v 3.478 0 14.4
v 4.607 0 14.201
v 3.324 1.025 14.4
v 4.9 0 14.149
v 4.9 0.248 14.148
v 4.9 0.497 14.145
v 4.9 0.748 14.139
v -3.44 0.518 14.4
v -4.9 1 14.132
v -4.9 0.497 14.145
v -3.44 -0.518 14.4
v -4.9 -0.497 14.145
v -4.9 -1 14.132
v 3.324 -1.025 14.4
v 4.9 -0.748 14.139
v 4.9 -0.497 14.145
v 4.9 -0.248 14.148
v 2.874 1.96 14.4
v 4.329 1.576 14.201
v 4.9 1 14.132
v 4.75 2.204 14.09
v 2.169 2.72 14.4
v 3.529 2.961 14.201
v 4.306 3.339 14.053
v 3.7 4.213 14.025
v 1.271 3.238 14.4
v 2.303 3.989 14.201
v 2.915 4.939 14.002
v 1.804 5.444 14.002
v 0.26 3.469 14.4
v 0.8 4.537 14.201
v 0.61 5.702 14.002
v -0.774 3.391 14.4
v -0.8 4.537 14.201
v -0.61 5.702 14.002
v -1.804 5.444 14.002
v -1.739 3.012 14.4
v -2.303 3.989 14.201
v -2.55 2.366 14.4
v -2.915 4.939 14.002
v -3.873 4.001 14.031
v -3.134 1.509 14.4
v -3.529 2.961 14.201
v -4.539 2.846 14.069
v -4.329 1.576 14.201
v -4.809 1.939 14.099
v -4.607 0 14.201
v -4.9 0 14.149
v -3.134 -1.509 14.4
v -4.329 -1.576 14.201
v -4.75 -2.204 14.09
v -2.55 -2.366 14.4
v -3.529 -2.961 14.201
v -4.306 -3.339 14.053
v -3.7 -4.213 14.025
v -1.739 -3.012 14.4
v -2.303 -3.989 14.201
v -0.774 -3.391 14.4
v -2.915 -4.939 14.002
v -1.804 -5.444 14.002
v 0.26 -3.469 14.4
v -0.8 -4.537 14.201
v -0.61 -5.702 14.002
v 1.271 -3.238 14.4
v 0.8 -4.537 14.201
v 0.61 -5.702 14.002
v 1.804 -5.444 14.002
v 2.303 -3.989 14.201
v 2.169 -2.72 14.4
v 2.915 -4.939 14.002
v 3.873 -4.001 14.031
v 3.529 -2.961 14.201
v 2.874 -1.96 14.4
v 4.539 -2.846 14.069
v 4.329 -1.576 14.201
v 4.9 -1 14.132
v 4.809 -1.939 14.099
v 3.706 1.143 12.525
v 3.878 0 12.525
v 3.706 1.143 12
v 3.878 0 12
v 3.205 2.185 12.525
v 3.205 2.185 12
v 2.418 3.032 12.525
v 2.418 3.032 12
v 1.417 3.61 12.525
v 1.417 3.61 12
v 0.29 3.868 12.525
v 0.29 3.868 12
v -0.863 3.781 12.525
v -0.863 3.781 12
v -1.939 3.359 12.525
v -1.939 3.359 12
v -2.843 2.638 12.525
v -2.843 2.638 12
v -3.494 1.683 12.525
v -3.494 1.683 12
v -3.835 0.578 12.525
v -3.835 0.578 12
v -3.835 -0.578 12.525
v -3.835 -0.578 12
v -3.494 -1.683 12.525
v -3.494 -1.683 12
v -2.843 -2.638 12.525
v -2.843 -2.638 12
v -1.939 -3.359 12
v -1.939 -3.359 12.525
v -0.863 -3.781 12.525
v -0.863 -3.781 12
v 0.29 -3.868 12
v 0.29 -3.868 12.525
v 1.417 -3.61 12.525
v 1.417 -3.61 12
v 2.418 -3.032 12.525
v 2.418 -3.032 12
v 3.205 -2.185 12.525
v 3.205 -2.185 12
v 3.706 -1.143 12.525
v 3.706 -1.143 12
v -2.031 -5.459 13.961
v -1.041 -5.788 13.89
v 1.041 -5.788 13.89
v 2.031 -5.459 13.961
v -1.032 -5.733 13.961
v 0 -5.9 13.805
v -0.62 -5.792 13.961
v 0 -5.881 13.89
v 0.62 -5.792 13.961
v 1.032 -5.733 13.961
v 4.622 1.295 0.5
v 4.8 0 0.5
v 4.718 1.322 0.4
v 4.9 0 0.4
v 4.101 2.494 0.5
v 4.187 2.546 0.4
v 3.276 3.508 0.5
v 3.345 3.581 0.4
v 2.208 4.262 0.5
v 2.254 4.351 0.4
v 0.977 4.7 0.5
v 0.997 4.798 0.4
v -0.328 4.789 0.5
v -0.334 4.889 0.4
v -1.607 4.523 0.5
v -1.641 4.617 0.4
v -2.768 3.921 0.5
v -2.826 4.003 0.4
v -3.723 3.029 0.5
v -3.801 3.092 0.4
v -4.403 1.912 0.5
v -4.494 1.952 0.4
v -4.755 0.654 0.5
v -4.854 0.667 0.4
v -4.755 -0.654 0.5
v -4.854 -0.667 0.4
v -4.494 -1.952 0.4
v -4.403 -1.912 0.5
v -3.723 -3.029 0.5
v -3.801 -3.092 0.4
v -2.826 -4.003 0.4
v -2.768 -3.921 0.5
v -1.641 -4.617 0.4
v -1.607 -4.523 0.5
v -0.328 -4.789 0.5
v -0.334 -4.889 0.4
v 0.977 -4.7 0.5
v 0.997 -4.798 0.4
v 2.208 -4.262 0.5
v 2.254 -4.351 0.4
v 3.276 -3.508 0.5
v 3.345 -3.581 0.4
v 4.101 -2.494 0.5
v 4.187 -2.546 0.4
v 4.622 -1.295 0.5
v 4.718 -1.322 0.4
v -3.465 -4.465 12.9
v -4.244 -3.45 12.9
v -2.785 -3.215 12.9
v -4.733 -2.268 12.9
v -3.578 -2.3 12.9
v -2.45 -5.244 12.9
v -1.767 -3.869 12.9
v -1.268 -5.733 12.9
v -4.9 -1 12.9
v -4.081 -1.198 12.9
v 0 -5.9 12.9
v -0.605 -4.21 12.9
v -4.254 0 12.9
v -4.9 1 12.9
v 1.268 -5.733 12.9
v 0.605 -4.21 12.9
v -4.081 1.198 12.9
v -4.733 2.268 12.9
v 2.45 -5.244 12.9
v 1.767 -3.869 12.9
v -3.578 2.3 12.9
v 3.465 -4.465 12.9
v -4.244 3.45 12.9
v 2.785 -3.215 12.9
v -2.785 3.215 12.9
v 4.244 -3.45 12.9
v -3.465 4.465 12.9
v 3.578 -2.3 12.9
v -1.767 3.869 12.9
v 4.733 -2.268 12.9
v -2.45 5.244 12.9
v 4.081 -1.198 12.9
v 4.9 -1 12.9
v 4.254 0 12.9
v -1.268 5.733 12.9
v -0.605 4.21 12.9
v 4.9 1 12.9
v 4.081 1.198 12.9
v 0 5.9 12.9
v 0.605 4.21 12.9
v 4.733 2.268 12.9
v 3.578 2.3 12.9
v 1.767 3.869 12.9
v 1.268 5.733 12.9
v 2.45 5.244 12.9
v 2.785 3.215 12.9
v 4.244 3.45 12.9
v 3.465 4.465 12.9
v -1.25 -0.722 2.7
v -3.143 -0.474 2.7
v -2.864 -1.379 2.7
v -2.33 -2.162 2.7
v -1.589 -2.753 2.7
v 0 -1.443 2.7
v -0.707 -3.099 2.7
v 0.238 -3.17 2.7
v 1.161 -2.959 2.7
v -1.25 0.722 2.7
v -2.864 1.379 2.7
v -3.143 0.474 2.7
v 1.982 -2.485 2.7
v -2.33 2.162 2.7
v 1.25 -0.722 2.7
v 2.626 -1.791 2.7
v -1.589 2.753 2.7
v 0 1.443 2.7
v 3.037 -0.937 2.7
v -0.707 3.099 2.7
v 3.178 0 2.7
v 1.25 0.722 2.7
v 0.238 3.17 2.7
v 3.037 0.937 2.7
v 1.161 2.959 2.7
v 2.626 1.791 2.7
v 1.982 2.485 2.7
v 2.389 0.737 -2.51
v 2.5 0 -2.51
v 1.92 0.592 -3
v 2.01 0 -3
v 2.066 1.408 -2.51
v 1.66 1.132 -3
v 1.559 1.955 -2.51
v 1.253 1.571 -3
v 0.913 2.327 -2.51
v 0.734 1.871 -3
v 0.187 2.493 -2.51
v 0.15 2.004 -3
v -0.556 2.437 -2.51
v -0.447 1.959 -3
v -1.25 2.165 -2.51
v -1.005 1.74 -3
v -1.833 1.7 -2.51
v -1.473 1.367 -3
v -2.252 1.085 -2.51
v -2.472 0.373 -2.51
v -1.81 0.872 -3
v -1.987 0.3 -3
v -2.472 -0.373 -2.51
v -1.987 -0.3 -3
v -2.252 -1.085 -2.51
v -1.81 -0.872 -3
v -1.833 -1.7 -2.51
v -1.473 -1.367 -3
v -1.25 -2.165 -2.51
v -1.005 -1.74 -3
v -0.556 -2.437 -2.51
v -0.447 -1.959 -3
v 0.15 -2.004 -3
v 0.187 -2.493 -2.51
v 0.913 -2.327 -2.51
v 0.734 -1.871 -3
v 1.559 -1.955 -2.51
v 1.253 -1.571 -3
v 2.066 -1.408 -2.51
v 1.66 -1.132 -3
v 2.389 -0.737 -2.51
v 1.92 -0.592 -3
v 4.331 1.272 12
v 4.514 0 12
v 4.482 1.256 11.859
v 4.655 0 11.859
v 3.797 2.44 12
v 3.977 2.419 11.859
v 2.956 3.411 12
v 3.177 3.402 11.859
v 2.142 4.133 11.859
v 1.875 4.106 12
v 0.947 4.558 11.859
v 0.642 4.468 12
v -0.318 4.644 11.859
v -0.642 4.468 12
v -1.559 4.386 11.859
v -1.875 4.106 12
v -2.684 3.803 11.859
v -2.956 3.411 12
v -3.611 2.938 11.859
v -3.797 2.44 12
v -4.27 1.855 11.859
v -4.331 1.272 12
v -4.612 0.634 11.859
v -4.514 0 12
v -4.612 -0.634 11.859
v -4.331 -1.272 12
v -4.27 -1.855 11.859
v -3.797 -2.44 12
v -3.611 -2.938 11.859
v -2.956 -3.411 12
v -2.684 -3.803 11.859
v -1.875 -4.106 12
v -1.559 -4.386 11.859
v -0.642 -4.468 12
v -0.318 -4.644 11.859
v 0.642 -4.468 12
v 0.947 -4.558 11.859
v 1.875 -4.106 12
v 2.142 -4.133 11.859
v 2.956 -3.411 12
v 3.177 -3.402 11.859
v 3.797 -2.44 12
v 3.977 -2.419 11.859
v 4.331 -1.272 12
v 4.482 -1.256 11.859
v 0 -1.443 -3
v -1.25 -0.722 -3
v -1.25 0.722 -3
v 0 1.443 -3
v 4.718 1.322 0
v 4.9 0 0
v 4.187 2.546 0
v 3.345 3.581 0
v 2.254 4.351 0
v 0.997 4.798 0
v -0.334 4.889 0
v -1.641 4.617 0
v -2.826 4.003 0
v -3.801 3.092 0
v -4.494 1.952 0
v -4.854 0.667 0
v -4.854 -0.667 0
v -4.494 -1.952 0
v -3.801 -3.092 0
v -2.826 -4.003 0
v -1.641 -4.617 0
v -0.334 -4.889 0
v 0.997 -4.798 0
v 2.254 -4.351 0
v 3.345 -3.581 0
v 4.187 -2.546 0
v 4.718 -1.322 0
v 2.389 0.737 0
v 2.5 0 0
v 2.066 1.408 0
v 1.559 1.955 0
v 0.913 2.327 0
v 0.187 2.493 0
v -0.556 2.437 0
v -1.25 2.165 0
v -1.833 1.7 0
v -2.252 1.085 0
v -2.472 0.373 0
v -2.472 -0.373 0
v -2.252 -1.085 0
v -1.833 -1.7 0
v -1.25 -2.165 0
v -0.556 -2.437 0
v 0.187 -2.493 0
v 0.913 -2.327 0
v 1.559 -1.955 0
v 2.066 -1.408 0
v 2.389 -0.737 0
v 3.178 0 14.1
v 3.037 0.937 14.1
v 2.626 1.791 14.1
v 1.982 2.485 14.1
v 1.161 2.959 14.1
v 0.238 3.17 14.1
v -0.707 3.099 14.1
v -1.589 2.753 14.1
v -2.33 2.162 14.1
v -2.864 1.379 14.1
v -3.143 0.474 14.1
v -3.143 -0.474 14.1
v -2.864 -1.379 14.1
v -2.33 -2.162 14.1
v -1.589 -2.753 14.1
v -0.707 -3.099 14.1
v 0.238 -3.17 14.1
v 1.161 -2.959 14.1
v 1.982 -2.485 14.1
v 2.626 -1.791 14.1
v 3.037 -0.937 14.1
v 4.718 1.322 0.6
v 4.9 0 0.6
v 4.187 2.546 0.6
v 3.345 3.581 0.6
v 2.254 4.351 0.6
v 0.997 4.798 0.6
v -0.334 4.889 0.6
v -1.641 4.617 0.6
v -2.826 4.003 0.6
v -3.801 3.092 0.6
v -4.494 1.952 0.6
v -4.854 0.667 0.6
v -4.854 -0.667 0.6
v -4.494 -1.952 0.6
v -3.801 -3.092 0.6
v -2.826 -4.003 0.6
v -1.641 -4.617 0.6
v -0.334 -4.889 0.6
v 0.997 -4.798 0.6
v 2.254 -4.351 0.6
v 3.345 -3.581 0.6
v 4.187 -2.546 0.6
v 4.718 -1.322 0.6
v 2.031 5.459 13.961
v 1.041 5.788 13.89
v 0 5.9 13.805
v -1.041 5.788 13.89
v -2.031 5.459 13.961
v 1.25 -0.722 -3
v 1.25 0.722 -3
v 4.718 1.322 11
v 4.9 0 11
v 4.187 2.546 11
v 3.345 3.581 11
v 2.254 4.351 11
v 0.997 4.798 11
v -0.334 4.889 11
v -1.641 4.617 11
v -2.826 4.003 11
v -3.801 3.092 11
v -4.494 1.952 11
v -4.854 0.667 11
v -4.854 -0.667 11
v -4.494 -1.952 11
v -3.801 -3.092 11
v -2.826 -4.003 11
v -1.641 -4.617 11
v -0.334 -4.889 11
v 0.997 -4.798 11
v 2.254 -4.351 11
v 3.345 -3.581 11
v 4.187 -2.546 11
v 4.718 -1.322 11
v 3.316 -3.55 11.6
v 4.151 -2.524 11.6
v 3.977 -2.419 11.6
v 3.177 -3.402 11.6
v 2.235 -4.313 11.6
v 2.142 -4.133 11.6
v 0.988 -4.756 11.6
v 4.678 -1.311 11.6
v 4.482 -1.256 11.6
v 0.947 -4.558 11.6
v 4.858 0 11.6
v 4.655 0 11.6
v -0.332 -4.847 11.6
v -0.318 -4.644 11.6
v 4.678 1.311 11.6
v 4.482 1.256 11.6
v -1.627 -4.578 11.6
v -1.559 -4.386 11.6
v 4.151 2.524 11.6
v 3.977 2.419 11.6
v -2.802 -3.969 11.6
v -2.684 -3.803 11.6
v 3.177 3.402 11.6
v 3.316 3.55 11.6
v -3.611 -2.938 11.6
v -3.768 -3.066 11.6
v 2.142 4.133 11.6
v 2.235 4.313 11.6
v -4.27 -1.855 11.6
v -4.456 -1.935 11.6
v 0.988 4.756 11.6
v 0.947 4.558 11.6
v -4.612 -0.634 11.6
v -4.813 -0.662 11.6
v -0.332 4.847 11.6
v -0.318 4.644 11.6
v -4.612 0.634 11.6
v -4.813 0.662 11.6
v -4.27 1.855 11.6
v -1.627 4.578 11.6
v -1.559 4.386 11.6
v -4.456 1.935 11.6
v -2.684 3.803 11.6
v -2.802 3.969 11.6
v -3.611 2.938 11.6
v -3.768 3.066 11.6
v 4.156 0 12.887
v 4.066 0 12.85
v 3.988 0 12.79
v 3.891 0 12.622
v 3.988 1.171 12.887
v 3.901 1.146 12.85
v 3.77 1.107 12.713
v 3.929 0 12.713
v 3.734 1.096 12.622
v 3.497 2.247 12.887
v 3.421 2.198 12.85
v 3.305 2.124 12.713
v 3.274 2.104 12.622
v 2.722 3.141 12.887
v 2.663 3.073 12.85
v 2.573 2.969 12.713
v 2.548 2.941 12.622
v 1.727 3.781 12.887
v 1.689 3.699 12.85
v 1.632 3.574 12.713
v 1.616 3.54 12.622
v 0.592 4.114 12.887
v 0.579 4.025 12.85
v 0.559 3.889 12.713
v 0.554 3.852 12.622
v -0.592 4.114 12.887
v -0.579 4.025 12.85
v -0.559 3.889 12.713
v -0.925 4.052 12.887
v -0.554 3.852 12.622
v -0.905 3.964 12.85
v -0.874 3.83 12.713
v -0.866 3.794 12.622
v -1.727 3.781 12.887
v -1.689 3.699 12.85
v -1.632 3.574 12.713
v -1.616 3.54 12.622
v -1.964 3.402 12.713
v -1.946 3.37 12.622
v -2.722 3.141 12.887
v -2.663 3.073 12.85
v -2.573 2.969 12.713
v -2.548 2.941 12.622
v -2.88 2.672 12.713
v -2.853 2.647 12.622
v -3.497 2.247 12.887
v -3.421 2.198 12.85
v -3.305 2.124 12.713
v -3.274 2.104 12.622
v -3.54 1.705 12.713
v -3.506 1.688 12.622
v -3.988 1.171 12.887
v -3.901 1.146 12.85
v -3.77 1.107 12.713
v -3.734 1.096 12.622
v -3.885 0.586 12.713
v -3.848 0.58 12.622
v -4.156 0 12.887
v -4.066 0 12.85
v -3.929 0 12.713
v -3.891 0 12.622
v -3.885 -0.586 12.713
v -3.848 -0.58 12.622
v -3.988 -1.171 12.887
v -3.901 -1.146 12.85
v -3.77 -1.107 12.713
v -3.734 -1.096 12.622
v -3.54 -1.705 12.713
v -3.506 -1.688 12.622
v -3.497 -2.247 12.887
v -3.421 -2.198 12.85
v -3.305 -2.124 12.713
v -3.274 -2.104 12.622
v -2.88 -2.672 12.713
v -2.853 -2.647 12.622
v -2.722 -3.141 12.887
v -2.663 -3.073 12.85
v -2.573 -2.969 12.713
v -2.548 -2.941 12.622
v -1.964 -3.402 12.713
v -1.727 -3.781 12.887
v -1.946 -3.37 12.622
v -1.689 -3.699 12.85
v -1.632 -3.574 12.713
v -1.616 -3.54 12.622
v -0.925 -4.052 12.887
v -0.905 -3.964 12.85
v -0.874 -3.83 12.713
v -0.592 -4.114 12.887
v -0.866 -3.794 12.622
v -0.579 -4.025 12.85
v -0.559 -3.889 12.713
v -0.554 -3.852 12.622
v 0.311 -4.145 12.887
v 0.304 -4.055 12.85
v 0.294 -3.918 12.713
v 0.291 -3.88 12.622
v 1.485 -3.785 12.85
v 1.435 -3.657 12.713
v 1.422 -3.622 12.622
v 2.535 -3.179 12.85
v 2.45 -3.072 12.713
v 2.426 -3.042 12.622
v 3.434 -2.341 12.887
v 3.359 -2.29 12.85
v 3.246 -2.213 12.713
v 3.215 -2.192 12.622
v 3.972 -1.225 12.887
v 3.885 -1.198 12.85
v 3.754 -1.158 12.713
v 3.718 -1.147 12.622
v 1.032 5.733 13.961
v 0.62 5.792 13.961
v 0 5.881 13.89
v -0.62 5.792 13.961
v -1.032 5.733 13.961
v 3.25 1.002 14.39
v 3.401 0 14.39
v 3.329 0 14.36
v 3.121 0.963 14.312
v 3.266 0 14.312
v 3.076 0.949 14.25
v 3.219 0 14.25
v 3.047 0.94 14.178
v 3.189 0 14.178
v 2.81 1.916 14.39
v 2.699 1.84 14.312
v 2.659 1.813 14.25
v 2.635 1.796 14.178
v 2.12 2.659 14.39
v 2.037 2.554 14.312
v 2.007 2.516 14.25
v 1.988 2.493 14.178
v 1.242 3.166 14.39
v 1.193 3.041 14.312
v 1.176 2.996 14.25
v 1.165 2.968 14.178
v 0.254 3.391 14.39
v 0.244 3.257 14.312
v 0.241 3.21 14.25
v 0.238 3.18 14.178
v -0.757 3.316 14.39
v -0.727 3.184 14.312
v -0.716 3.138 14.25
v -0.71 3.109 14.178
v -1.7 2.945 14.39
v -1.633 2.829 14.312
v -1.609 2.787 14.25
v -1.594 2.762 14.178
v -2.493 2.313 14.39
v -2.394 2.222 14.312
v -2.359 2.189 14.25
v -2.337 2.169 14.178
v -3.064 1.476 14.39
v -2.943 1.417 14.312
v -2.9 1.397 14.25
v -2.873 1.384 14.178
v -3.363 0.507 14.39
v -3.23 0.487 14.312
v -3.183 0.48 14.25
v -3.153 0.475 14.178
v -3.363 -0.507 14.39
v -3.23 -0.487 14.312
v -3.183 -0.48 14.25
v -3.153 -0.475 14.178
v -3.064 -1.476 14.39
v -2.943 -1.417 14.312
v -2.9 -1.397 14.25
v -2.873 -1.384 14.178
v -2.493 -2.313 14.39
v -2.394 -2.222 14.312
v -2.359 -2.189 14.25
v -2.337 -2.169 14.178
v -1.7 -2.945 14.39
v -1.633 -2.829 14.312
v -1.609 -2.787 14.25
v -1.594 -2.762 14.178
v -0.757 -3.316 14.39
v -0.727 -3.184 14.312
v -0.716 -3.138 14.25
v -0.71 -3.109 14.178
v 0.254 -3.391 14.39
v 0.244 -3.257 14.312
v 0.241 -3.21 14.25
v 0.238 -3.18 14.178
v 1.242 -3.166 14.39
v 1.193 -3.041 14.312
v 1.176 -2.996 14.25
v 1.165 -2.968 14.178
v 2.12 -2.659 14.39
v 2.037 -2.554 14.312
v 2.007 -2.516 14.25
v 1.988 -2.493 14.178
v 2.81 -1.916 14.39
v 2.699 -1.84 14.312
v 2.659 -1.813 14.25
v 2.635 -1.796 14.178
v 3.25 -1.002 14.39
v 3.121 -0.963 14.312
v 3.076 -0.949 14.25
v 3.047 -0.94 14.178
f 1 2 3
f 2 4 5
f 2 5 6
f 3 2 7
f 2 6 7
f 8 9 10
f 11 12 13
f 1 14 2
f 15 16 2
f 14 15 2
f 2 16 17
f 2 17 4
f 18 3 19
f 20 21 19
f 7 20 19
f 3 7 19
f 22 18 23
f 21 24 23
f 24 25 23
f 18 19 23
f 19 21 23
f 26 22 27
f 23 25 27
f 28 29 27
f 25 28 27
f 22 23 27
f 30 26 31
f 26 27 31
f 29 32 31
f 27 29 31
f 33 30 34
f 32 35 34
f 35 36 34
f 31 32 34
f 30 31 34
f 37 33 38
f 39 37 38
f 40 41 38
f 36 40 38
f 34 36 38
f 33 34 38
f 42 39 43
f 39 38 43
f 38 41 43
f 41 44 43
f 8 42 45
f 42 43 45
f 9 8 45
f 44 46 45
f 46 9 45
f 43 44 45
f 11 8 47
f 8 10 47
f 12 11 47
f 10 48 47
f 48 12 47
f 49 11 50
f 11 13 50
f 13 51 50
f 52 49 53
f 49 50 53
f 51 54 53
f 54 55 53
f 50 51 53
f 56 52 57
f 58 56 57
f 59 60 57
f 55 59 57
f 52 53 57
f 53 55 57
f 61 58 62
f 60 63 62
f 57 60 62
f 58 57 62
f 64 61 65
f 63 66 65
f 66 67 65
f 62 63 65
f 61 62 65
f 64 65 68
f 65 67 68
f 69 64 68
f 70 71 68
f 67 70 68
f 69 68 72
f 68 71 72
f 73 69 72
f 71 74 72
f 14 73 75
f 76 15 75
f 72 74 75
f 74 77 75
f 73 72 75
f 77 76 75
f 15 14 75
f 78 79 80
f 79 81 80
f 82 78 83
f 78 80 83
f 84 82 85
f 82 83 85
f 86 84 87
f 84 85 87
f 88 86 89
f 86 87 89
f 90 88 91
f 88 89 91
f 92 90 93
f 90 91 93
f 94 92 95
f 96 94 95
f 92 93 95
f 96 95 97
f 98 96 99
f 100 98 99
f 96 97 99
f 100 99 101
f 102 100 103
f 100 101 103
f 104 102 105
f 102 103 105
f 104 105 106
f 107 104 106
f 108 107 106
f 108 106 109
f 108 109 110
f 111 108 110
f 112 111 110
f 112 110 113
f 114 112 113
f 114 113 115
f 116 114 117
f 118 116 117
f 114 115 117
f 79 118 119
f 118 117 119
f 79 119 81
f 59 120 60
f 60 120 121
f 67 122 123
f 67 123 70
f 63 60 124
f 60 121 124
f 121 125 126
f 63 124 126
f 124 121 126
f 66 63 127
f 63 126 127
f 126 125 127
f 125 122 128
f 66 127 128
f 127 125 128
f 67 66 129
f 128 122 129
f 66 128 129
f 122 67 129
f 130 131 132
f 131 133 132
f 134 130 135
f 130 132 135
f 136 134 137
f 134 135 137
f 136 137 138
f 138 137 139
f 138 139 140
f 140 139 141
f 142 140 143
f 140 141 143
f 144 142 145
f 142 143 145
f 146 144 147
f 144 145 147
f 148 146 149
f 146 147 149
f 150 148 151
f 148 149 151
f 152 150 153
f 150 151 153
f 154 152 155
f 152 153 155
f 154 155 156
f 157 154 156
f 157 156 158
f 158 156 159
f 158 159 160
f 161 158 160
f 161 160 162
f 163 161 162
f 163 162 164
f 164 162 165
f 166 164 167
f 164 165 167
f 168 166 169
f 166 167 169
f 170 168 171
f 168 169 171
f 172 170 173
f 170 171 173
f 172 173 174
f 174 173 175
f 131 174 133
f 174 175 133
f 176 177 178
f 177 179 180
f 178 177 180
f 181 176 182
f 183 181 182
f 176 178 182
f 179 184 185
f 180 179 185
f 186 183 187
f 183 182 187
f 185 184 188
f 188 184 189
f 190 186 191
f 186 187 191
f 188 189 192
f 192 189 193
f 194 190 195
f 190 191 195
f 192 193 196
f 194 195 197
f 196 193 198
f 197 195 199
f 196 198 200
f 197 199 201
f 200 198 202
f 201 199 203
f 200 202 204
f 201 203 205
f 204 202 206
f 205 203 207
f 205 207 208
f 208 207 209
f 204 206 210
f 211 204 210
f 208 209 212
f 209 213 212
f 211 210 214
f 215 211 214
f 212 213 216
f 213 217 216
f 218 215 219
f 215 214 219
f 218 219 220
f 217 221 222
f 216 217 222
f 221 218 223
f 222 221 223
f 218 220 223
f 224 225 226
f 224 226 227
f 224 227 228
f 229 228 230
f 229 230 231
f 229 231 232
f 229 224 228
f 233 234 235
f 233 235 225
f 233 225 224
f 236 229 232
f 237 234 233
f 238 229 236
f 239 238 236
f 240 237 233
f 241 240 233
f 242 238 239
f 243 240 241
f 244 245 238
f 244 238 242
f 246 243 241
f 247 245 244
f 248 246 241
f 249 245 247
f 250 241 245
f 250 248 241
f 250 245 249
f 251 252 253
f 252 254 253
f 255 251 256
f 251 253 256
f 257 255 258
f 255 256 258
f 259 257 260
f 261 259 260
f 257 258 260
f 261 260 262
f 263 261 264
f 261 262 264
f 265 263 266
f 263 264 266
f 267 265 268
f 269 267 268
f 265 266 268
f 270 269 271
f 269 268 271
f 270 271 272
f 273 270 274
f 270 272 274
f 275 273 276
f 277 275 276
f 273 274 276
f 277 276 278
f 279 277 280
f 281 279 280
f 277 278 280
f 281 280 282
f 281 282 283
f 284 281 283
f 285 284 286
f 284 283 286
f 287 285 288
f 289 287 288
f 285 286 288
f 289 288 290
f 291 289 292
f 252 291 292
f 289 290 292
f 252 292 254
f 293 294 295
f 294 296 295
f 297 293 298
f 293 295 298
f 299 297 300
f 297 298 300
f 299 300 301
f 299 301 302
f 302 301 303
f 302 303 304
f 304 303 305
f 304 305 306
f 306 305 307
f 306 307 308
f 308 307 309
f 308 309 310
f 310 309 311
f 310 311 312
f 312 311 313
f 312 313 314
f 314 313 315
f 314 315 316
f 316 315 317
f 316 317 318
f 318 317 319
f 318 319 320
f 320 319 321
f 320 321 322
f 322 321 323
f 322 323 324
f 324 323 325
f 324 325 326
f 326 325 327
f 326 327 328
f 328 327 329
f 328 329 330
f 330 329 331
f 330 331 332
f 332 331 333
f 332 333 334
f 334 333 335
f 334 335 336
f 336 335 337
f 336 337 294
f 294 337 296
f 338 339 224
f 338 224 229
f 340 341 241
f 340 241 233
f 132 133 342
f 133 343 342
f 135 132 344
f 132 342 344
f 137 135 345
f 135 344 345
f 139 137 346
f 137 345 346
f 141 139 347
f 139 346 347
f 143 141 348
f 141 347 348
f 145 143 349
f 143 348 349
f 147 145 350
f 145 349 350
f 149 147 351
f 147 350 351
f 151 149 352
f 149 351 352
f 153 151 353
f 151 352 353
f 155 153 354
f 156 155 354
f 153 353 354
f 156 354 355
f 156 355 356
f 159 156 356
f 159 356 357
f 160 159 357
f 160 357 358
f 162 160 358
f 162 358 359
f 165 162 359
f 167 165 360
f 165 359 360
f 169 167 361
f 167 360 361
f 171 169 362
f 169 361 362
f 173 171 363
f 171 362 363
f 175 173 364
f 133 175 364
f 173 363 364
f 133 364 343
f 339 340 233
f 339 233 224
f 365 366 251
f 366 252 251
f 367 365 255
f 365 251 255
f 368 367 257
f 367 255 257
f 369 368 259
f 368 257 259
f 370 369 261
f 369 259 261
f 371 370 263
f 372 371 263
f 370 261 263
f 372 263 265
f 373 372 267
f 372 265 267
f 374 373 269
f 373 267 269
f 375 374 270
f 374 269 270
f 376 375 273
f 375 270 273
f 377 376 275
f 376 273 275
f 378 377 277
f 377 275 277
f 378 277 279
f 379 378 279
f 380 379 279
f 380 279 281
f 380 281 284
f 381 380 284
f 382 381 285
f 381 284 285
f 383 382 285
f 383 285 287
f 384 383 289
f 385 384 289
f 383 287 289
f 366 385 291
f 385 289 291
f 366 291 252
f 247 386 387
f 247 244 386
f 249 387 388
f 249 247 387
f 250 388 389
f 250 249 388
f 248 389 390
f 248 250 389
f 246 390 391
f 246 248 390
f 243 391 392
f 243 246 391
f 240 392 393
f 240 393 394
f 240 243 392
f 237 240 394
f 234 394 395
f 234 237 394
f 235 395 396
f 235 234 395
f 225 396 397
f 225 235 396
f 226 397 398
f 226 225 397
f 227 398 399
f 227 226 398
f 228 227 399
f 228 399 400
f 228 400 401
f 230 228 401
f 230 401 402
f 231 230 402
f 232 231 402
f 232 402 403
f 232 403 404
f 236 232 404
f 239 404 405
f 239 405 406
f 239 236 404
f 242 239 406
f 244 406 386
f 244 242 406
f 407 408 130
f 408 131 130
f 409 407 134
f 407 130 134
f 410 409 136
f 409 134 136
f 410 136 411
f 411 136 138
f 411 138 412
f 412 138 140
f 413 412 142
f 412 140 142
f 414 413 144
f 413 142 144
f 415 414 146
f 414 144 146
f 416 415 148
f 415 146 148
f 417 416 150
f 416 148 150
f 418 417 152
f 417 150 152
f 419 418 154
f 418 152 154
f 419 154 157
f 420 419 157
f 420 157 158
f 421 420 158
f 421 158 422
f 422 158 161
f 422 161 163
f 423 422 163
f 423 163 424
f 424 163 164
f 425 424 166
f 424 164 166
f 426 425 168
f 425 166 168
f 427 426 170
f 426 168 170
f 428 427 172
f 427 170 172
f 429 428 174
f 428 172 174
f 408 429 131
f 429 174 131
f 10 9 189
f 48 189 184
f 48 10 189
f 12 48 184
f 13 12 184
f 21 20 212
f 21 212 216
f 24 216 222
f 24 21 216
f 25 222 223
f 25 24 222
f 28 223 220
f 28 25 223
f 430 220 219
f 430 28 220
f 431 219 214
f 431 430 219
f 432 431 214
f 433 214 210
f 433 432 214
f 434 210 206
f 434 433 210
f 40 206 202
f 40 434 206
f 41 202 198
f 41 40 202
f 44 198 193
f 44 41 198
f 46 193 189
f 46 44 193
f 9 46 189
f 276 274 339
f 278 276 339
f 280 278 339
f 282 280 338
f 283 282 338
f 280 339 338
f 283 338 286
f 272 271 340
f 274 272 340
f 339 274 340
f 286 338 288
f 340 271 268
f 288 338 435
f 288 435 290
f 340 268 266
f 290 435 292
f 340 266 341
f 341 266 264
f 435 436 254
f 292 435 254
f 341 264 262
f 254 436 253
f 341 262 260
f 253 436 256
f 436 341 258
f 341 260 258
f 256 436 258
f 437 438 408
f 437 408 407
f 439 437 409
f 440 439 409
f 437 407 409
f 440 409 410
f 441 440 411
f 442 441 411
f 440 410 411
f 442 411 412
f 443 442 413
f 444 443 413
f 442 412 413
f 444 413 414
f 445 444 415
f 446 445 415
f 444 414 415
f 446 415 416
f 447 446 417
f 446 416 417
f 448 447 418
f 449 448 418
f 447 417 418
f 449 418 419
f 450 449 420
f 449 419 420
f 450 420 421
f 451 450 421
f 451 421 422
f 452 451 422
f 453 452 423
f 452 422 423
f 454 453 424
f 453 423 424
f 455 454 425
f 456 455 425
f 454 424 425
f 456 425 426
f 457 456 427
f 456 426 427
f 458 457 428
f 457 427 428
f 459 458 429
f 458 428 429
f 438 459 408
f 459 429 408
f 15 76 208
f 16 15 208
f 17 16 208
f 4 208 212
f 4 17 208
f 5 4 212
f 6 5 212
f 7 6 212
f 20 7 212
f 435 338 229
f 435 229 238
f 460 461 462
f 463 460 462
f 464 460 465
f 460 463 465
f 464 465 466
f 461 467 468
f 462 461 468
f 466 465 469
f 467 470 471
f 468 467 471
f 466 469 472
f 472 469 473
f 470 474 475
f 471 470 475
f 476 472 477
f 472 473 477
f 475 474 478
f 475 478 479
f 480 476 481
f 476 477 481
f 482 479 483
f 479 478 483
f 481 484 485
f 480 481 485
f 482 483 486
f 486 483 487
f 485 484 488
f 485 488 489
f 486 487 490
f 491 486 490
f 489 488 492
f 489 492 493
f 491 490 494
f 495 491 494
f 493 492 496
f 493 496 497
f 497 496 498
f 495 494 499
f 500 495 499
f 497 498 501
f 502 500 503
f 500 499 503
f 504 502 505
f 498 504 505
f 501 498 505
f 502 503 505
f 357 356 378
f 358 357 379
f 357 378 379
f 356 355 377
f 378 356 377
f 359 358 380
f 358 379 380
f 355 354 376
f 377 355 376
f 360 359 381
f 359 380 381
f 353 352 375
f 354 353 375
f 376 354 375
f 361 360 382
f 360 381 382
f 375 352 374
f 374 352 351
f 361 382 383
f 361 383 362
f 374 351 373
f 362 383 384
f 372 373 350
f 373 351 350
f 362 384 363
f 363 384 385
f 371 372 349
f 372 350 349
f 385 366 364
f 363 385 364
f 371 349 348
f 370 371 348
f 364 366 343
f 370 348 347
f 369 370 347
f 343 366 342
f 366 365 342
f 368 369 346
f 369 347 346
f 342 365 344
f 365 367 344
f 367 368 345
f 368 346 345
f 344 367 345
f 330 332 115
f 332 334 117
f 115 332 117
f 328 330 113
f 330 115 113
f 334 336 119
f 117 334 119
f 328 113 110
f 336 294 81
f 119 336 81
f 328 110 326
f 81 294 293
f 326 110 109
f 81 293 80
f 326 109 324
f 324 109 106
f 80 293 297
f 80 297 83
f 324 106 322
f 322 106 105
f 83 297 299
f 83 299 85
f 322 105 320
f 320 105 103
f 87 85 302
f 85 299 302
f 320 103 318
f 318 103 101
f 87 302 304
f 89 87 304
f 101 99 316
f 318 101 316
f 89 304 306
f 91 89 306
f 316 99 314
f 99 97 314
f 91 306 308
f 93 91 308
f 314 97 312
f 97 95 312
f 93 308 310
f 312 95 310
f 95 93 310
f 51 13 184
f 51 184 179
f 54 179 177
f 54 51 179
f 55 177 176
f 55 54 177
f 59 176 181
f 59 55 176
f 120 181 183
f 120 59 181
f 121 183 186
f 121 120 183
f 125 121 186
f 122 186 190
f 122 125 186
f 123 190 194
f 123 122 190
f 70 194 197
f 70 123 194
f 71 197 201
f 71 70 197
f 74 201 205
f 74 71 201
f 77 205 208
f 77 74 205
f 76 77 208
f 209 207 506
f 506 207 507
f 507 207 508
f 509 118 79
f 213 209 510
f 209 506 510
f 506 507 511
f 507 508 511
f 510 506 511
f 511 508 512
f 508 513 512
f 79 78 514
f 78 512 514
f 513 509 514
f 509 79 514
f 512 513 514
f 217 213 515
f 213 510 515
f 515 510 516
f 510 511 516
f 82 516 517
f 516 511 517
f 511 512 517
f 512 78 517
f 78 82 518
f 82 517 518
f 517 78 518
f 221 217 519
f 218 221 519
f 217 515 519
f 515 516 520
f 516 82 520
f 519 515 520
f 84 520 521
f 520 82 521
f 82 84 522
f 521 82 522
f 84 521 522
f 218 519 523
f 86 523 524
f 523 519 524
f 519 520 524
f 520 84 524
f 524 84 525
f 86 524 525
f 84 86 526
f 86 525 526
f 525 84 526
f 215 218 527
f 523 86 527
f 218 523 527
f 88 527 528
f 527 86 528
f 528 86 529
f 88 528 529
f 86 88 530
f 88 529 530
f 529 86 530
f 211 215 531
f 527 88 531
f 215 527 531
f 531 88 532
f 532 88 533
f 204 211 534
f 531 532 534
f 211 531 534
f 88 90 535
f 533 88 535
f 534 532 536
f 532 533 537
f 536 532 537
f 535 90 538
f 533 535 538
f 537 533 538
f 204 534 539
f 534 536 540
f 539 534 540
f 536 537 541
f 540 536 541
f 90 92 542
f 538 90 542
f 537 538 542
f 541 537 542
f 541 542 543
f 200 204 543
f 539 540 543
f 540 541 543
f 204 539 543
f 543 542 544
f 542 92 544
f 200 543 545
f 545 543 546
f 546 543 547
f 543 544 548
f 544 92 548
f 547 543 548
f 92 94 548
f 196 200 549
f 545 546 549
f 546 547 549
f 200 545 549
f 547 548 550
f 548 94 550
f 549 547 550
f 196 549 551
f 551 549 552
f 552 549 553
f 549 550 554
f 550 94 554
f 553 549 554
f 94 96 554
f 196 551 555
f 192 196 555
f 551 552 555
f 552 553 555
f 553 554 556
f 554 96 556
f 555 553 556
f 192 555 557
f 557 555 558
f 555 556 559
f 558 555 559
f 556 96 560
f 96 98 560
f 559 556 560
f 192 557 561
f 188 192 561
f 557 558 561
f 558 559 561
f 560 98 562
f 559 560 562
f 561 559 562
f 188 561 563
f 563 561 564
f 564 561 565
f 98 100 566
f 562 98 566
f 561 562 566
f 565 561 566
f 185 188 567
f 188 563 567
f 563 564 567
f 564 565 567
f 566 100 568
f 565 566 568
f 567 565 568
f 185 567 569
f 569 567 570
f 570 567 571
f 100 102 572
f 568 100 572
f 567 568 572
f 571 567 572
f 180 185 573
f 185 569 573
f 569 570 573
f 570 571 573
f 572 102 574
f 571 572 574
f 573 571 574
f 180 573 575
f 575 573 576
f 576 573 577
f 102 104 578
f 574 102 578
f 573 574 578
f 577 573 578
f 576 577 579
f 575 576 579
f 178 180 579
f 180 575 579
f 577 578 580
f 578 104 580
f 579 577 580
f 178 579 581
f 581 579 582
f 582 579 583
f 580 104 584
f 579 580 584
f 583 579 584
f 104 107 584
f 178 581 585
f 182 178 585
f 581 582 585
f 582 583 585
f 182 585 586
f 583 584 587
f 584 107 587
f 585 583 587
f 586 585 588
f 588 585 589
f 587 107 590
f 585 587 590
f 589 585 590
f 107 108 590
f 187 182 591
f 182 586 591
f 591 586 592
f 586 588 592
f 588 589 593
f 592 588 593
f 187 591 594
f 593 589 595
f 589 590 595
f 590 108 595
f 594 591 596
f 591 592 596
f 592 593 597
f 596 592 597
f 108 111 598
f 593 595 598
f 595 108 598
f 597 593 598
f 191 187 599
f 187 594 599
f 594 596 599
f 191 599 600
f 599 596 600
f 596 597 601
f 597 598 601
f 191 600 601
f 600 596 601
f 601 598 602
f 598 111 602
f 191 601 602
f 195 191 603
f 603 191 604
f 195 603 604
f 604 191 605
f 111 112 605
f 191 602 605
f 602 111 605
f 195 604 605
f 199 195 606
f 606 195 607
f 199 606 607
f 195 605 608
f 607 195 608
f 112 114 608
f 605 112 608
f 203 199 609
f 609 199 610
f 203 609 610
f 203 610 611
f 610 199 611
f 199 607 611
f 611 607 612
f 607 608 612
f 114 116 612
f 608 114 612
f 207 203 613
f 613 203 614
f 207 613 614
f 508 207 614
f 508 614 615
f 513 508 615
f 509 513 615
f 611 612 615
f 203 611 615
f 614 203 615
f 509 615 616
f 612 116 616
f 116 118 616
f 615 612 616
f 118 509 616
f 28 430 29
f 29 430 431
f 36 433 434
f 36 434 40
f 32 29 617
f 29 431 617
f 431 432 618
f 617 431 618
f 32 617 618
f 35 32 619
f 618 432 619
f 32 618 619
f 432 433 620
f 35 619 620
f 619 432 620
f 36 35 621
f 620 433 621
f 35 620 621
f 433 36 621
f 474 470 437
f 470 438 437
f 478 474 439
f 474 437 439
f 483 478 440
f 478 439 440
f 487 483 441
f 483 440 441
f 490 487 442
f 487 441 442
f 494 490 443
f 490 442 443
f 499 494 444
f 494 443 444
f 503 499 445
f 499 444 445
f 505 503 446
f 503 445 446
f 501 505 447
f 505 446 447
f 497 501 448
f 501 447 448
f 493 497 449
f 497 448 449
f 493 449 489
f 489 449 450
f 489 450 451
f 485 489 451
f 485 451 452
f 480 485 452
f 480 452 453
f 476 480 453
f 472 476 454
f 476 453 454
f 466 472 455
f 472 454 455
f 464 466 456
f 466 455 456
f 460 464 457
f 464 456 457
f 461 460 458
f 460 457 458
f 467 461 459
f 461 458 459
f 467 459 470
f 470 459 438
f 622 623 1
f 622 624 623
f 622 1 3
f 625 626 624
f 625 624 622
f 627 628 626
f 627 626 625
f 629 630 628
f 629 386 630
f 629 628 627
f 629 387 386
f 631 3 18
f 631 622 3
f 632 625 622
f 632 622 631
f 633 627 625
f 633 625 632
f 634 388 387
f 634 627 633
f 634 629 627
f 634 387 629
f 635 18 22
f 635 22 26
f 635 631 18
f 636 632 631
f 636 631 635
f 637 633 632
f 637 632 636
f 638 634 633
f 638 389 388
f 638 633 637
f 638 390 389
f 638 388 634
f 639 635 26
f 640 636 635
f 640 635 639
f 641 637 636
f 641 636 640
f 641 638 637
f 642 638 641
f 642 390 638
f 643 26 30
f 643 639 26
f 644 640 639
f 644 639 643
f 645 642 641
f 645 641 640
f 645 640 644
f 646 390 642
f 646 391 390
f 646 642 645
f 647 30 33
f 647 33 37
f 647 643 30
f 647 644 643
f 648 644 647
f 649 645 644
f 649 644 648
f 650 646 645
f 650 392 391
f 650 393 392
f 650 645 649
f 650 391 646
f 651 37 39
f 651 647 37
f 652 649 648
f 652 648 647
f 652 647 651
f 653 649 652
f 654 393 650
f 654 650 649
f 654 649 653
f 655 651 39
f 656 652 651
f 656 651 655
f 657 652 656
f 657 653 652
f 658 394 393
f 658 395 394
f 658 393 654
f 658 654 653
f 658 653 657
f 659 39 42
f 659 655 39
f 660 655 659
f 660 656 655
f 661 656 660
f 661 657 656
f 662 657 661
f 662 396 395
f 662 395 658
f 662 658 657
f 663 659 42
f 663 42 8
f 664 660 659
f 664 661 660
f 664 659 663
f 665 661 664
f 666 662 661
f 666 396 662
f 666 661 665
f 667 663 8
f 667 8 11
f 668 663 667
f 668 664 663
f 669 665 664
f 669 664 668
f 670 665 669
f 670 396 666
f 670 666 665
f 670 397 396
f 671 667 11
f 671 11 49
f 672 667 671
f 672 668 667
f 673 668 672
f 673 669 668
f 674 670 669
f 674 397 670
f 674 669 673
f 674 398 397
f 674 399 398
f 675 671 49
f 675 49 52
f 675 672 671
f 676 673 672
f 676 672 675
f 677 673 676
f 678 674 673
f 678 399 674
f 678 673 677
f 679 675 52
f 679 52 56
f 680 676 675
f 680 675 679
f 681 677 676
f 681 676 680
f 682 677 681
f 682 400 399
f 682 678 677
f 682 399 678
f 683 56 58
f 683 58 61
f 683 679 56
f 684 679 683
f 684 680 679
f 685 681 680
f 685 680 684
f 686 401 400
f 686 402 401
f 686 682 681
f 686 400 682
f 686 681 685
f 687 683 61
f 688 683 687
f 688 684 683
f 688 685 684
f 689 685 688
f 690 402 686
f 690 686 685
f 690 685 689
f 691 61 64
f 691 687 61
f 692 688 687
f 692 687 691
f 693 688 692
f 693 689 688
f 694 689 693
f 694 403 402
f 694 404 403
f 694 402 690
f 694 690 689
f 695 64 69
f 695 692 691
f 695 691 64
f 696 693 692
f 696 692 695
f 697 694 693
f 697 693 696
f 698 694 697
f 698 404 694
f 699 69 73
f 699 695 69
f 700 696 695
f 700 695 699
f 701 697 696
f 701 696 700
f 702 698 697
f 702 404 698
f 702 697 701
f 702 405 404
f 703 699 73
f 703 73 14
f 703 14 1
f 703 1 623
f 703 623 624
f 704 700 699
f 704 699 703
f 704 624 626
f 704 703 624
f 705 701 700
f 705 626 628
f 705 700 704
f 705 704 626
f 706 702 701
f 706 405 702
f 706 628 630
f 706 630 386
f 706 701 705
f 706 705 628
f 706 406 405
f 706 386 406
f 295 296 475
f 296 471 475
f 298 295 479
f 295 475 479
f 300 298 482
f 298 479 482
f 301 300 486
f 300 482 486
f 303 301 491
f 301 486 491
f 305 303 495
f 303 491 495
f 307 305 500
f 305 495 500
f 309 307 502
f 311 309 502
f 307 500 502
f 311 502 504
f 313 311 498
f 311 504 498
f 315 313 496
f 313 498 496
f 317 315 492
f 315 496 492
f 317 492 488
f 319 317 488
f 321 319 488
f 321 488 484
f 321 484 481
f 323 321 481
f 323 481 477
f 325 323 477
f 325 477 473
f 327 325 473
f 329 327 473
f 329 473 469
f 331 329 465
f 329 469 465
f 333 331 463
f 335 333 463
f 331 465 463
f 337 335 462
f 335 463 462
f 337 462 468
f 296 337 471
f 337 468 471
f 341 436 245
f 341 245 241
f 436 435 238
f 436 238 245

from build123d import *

# Parameters (mm, degrees)
SKETCH2_W          = 23.6
SKETCH2_H          = 23.6
CUT_EXTRUDE1_DEPTH = 1.5
CUT_EXTRUDE2_DEPTH = 5.7


with BuildPart() as part:
    # Sketch1 → Revolve1 (revolve)
    with BuildSketch(Plane(origin=(0, 0, 0), x_dir=(0, 0, -1), z_dir=(1, 0, 0)), mode=Mode.PRIVATE) as revolve1_sk:
        with BuildLine():
            Line((-14.4, 0), (-14.4, 3.4785))
            Line((-14.4, 3.4785), (-14.002165841, 5.734729636))
            ThreePointArc((-14.002165841, 5.734729636), (-13.933761812, 5.853208889), (-13.80520429, 5.9))
            Line((-13.80520429, 5.9), (-12.9, 5.9))
            Line((-12.9, 5.9), (-12.9, 4.2535))
            ThreePointArc((-12.9, 4.2535), (-12.790165043, 3.988334957), (-12.525, 3.8785))
            Line((-12.525, 3.8785), (-12, 3.8785))
            Line((-12, 3.8785), (-12, 4.513578644))
            Line((-12, 4.513578644), (-11.858578644, 4.655))
            Line((-11.858578644, 4.655), (-11.6, 4.655))
            Line((-11.6, 4.655), (-11.6, 4.858043913))
            Line((-11.6, 4.858043913), (-11, 4.9))
            Line((-11, 4.9), (-0.6, 4.9))
            Line((-0.6, 4.9), (-0.5, 4.8))
            Line((-0.5, 4.8), (-0.4, 4.9))
            Line((-0.4, 4.9), (0, 4.9))
            Line((0, 4.9), (0, 2.5))
            Line((0, 2.5), (2.5095, 2.5))
            Line((2.5095, 2.5), (3, 2.0095))
            Line((3, 2.0095), (3, 0))
            Line((3, 0), (-14.4, 0))
        make_face()
    revolve(revolve1_sk.sketch.rotate(Axis((0, 0, -3), (0, 0, 1)), 270), axis=Axis((0, 0, -3), (0, 0, 1)))

    # Sketch2 → Cut-Extrude1 (cut)
    with BuildSketch(Plane.XY.offset(14.4)):
        Rectangle(SKETCH2_W, SKETCH2_H)
        with BuildLine():
            Line((-4.9, 1), (-4.9, -1))
            ThreePointArc((-4.9, -1), (0, -5.9), (4.9, -1))
            Line((4.9, -1), (4.9, 1))
            ThreePointArc((4.9, 1), (0, 5.9), (-4.9, 1))
        make_face(mode=Mode.SUBTRACT)
    extrude(amount=-CUT_EXTRUDE1_DEPTH, mode=Mode.SUBTRACT)

    # Sketch3 → Cut-Extrude2 (cut)
    with BuildSketch(Plane.XY.offset(-3)):
        Polygon((-1.25, -0.721687836), (0, -1.443375673), (1.25, -0.721687836), (1.25, 0.721687836), (0, 1.443375673), (-1.25, 0.721687836), align=None)
    extrude(amount=CUT_EXTRUDE2_DEPTH, mode=Mode.SUBTRACT)

    # Sketch4 → Cut-Revolve1 (revolve, cut)
    with BuildSketch(Plane(origin=(0, 0, 0), x_dir=(0, 0, -1), z_dir=(1, 0, 0)), mode=Mode.PRIVATE) as cut_revolve1_sk:
        with BuildLine():
            Line((-14.4, 0), (-14.4, 3.4785))
            ThreePointArc((-14.4, 3.4785), (-14.312132034, 3.266367966), (-14.1, 3.1785))
            Line((-14.1, 3.1785), (-2.7, 3.1785))
            Line((-2.7, 3.1785), (-2.7, 0))
            Line((-2.7, 0), (-14.4, 0))
        make_face()
    revolve(cut_revolve1_sk.sketch.rotate(Axis((0, 0, 2.7), (0, 0, 1)), 270), axis=Axis((0, 0, 2.7), (0, 0, 1)), mode=Mode.SUBTRACT)


solid = part.part
